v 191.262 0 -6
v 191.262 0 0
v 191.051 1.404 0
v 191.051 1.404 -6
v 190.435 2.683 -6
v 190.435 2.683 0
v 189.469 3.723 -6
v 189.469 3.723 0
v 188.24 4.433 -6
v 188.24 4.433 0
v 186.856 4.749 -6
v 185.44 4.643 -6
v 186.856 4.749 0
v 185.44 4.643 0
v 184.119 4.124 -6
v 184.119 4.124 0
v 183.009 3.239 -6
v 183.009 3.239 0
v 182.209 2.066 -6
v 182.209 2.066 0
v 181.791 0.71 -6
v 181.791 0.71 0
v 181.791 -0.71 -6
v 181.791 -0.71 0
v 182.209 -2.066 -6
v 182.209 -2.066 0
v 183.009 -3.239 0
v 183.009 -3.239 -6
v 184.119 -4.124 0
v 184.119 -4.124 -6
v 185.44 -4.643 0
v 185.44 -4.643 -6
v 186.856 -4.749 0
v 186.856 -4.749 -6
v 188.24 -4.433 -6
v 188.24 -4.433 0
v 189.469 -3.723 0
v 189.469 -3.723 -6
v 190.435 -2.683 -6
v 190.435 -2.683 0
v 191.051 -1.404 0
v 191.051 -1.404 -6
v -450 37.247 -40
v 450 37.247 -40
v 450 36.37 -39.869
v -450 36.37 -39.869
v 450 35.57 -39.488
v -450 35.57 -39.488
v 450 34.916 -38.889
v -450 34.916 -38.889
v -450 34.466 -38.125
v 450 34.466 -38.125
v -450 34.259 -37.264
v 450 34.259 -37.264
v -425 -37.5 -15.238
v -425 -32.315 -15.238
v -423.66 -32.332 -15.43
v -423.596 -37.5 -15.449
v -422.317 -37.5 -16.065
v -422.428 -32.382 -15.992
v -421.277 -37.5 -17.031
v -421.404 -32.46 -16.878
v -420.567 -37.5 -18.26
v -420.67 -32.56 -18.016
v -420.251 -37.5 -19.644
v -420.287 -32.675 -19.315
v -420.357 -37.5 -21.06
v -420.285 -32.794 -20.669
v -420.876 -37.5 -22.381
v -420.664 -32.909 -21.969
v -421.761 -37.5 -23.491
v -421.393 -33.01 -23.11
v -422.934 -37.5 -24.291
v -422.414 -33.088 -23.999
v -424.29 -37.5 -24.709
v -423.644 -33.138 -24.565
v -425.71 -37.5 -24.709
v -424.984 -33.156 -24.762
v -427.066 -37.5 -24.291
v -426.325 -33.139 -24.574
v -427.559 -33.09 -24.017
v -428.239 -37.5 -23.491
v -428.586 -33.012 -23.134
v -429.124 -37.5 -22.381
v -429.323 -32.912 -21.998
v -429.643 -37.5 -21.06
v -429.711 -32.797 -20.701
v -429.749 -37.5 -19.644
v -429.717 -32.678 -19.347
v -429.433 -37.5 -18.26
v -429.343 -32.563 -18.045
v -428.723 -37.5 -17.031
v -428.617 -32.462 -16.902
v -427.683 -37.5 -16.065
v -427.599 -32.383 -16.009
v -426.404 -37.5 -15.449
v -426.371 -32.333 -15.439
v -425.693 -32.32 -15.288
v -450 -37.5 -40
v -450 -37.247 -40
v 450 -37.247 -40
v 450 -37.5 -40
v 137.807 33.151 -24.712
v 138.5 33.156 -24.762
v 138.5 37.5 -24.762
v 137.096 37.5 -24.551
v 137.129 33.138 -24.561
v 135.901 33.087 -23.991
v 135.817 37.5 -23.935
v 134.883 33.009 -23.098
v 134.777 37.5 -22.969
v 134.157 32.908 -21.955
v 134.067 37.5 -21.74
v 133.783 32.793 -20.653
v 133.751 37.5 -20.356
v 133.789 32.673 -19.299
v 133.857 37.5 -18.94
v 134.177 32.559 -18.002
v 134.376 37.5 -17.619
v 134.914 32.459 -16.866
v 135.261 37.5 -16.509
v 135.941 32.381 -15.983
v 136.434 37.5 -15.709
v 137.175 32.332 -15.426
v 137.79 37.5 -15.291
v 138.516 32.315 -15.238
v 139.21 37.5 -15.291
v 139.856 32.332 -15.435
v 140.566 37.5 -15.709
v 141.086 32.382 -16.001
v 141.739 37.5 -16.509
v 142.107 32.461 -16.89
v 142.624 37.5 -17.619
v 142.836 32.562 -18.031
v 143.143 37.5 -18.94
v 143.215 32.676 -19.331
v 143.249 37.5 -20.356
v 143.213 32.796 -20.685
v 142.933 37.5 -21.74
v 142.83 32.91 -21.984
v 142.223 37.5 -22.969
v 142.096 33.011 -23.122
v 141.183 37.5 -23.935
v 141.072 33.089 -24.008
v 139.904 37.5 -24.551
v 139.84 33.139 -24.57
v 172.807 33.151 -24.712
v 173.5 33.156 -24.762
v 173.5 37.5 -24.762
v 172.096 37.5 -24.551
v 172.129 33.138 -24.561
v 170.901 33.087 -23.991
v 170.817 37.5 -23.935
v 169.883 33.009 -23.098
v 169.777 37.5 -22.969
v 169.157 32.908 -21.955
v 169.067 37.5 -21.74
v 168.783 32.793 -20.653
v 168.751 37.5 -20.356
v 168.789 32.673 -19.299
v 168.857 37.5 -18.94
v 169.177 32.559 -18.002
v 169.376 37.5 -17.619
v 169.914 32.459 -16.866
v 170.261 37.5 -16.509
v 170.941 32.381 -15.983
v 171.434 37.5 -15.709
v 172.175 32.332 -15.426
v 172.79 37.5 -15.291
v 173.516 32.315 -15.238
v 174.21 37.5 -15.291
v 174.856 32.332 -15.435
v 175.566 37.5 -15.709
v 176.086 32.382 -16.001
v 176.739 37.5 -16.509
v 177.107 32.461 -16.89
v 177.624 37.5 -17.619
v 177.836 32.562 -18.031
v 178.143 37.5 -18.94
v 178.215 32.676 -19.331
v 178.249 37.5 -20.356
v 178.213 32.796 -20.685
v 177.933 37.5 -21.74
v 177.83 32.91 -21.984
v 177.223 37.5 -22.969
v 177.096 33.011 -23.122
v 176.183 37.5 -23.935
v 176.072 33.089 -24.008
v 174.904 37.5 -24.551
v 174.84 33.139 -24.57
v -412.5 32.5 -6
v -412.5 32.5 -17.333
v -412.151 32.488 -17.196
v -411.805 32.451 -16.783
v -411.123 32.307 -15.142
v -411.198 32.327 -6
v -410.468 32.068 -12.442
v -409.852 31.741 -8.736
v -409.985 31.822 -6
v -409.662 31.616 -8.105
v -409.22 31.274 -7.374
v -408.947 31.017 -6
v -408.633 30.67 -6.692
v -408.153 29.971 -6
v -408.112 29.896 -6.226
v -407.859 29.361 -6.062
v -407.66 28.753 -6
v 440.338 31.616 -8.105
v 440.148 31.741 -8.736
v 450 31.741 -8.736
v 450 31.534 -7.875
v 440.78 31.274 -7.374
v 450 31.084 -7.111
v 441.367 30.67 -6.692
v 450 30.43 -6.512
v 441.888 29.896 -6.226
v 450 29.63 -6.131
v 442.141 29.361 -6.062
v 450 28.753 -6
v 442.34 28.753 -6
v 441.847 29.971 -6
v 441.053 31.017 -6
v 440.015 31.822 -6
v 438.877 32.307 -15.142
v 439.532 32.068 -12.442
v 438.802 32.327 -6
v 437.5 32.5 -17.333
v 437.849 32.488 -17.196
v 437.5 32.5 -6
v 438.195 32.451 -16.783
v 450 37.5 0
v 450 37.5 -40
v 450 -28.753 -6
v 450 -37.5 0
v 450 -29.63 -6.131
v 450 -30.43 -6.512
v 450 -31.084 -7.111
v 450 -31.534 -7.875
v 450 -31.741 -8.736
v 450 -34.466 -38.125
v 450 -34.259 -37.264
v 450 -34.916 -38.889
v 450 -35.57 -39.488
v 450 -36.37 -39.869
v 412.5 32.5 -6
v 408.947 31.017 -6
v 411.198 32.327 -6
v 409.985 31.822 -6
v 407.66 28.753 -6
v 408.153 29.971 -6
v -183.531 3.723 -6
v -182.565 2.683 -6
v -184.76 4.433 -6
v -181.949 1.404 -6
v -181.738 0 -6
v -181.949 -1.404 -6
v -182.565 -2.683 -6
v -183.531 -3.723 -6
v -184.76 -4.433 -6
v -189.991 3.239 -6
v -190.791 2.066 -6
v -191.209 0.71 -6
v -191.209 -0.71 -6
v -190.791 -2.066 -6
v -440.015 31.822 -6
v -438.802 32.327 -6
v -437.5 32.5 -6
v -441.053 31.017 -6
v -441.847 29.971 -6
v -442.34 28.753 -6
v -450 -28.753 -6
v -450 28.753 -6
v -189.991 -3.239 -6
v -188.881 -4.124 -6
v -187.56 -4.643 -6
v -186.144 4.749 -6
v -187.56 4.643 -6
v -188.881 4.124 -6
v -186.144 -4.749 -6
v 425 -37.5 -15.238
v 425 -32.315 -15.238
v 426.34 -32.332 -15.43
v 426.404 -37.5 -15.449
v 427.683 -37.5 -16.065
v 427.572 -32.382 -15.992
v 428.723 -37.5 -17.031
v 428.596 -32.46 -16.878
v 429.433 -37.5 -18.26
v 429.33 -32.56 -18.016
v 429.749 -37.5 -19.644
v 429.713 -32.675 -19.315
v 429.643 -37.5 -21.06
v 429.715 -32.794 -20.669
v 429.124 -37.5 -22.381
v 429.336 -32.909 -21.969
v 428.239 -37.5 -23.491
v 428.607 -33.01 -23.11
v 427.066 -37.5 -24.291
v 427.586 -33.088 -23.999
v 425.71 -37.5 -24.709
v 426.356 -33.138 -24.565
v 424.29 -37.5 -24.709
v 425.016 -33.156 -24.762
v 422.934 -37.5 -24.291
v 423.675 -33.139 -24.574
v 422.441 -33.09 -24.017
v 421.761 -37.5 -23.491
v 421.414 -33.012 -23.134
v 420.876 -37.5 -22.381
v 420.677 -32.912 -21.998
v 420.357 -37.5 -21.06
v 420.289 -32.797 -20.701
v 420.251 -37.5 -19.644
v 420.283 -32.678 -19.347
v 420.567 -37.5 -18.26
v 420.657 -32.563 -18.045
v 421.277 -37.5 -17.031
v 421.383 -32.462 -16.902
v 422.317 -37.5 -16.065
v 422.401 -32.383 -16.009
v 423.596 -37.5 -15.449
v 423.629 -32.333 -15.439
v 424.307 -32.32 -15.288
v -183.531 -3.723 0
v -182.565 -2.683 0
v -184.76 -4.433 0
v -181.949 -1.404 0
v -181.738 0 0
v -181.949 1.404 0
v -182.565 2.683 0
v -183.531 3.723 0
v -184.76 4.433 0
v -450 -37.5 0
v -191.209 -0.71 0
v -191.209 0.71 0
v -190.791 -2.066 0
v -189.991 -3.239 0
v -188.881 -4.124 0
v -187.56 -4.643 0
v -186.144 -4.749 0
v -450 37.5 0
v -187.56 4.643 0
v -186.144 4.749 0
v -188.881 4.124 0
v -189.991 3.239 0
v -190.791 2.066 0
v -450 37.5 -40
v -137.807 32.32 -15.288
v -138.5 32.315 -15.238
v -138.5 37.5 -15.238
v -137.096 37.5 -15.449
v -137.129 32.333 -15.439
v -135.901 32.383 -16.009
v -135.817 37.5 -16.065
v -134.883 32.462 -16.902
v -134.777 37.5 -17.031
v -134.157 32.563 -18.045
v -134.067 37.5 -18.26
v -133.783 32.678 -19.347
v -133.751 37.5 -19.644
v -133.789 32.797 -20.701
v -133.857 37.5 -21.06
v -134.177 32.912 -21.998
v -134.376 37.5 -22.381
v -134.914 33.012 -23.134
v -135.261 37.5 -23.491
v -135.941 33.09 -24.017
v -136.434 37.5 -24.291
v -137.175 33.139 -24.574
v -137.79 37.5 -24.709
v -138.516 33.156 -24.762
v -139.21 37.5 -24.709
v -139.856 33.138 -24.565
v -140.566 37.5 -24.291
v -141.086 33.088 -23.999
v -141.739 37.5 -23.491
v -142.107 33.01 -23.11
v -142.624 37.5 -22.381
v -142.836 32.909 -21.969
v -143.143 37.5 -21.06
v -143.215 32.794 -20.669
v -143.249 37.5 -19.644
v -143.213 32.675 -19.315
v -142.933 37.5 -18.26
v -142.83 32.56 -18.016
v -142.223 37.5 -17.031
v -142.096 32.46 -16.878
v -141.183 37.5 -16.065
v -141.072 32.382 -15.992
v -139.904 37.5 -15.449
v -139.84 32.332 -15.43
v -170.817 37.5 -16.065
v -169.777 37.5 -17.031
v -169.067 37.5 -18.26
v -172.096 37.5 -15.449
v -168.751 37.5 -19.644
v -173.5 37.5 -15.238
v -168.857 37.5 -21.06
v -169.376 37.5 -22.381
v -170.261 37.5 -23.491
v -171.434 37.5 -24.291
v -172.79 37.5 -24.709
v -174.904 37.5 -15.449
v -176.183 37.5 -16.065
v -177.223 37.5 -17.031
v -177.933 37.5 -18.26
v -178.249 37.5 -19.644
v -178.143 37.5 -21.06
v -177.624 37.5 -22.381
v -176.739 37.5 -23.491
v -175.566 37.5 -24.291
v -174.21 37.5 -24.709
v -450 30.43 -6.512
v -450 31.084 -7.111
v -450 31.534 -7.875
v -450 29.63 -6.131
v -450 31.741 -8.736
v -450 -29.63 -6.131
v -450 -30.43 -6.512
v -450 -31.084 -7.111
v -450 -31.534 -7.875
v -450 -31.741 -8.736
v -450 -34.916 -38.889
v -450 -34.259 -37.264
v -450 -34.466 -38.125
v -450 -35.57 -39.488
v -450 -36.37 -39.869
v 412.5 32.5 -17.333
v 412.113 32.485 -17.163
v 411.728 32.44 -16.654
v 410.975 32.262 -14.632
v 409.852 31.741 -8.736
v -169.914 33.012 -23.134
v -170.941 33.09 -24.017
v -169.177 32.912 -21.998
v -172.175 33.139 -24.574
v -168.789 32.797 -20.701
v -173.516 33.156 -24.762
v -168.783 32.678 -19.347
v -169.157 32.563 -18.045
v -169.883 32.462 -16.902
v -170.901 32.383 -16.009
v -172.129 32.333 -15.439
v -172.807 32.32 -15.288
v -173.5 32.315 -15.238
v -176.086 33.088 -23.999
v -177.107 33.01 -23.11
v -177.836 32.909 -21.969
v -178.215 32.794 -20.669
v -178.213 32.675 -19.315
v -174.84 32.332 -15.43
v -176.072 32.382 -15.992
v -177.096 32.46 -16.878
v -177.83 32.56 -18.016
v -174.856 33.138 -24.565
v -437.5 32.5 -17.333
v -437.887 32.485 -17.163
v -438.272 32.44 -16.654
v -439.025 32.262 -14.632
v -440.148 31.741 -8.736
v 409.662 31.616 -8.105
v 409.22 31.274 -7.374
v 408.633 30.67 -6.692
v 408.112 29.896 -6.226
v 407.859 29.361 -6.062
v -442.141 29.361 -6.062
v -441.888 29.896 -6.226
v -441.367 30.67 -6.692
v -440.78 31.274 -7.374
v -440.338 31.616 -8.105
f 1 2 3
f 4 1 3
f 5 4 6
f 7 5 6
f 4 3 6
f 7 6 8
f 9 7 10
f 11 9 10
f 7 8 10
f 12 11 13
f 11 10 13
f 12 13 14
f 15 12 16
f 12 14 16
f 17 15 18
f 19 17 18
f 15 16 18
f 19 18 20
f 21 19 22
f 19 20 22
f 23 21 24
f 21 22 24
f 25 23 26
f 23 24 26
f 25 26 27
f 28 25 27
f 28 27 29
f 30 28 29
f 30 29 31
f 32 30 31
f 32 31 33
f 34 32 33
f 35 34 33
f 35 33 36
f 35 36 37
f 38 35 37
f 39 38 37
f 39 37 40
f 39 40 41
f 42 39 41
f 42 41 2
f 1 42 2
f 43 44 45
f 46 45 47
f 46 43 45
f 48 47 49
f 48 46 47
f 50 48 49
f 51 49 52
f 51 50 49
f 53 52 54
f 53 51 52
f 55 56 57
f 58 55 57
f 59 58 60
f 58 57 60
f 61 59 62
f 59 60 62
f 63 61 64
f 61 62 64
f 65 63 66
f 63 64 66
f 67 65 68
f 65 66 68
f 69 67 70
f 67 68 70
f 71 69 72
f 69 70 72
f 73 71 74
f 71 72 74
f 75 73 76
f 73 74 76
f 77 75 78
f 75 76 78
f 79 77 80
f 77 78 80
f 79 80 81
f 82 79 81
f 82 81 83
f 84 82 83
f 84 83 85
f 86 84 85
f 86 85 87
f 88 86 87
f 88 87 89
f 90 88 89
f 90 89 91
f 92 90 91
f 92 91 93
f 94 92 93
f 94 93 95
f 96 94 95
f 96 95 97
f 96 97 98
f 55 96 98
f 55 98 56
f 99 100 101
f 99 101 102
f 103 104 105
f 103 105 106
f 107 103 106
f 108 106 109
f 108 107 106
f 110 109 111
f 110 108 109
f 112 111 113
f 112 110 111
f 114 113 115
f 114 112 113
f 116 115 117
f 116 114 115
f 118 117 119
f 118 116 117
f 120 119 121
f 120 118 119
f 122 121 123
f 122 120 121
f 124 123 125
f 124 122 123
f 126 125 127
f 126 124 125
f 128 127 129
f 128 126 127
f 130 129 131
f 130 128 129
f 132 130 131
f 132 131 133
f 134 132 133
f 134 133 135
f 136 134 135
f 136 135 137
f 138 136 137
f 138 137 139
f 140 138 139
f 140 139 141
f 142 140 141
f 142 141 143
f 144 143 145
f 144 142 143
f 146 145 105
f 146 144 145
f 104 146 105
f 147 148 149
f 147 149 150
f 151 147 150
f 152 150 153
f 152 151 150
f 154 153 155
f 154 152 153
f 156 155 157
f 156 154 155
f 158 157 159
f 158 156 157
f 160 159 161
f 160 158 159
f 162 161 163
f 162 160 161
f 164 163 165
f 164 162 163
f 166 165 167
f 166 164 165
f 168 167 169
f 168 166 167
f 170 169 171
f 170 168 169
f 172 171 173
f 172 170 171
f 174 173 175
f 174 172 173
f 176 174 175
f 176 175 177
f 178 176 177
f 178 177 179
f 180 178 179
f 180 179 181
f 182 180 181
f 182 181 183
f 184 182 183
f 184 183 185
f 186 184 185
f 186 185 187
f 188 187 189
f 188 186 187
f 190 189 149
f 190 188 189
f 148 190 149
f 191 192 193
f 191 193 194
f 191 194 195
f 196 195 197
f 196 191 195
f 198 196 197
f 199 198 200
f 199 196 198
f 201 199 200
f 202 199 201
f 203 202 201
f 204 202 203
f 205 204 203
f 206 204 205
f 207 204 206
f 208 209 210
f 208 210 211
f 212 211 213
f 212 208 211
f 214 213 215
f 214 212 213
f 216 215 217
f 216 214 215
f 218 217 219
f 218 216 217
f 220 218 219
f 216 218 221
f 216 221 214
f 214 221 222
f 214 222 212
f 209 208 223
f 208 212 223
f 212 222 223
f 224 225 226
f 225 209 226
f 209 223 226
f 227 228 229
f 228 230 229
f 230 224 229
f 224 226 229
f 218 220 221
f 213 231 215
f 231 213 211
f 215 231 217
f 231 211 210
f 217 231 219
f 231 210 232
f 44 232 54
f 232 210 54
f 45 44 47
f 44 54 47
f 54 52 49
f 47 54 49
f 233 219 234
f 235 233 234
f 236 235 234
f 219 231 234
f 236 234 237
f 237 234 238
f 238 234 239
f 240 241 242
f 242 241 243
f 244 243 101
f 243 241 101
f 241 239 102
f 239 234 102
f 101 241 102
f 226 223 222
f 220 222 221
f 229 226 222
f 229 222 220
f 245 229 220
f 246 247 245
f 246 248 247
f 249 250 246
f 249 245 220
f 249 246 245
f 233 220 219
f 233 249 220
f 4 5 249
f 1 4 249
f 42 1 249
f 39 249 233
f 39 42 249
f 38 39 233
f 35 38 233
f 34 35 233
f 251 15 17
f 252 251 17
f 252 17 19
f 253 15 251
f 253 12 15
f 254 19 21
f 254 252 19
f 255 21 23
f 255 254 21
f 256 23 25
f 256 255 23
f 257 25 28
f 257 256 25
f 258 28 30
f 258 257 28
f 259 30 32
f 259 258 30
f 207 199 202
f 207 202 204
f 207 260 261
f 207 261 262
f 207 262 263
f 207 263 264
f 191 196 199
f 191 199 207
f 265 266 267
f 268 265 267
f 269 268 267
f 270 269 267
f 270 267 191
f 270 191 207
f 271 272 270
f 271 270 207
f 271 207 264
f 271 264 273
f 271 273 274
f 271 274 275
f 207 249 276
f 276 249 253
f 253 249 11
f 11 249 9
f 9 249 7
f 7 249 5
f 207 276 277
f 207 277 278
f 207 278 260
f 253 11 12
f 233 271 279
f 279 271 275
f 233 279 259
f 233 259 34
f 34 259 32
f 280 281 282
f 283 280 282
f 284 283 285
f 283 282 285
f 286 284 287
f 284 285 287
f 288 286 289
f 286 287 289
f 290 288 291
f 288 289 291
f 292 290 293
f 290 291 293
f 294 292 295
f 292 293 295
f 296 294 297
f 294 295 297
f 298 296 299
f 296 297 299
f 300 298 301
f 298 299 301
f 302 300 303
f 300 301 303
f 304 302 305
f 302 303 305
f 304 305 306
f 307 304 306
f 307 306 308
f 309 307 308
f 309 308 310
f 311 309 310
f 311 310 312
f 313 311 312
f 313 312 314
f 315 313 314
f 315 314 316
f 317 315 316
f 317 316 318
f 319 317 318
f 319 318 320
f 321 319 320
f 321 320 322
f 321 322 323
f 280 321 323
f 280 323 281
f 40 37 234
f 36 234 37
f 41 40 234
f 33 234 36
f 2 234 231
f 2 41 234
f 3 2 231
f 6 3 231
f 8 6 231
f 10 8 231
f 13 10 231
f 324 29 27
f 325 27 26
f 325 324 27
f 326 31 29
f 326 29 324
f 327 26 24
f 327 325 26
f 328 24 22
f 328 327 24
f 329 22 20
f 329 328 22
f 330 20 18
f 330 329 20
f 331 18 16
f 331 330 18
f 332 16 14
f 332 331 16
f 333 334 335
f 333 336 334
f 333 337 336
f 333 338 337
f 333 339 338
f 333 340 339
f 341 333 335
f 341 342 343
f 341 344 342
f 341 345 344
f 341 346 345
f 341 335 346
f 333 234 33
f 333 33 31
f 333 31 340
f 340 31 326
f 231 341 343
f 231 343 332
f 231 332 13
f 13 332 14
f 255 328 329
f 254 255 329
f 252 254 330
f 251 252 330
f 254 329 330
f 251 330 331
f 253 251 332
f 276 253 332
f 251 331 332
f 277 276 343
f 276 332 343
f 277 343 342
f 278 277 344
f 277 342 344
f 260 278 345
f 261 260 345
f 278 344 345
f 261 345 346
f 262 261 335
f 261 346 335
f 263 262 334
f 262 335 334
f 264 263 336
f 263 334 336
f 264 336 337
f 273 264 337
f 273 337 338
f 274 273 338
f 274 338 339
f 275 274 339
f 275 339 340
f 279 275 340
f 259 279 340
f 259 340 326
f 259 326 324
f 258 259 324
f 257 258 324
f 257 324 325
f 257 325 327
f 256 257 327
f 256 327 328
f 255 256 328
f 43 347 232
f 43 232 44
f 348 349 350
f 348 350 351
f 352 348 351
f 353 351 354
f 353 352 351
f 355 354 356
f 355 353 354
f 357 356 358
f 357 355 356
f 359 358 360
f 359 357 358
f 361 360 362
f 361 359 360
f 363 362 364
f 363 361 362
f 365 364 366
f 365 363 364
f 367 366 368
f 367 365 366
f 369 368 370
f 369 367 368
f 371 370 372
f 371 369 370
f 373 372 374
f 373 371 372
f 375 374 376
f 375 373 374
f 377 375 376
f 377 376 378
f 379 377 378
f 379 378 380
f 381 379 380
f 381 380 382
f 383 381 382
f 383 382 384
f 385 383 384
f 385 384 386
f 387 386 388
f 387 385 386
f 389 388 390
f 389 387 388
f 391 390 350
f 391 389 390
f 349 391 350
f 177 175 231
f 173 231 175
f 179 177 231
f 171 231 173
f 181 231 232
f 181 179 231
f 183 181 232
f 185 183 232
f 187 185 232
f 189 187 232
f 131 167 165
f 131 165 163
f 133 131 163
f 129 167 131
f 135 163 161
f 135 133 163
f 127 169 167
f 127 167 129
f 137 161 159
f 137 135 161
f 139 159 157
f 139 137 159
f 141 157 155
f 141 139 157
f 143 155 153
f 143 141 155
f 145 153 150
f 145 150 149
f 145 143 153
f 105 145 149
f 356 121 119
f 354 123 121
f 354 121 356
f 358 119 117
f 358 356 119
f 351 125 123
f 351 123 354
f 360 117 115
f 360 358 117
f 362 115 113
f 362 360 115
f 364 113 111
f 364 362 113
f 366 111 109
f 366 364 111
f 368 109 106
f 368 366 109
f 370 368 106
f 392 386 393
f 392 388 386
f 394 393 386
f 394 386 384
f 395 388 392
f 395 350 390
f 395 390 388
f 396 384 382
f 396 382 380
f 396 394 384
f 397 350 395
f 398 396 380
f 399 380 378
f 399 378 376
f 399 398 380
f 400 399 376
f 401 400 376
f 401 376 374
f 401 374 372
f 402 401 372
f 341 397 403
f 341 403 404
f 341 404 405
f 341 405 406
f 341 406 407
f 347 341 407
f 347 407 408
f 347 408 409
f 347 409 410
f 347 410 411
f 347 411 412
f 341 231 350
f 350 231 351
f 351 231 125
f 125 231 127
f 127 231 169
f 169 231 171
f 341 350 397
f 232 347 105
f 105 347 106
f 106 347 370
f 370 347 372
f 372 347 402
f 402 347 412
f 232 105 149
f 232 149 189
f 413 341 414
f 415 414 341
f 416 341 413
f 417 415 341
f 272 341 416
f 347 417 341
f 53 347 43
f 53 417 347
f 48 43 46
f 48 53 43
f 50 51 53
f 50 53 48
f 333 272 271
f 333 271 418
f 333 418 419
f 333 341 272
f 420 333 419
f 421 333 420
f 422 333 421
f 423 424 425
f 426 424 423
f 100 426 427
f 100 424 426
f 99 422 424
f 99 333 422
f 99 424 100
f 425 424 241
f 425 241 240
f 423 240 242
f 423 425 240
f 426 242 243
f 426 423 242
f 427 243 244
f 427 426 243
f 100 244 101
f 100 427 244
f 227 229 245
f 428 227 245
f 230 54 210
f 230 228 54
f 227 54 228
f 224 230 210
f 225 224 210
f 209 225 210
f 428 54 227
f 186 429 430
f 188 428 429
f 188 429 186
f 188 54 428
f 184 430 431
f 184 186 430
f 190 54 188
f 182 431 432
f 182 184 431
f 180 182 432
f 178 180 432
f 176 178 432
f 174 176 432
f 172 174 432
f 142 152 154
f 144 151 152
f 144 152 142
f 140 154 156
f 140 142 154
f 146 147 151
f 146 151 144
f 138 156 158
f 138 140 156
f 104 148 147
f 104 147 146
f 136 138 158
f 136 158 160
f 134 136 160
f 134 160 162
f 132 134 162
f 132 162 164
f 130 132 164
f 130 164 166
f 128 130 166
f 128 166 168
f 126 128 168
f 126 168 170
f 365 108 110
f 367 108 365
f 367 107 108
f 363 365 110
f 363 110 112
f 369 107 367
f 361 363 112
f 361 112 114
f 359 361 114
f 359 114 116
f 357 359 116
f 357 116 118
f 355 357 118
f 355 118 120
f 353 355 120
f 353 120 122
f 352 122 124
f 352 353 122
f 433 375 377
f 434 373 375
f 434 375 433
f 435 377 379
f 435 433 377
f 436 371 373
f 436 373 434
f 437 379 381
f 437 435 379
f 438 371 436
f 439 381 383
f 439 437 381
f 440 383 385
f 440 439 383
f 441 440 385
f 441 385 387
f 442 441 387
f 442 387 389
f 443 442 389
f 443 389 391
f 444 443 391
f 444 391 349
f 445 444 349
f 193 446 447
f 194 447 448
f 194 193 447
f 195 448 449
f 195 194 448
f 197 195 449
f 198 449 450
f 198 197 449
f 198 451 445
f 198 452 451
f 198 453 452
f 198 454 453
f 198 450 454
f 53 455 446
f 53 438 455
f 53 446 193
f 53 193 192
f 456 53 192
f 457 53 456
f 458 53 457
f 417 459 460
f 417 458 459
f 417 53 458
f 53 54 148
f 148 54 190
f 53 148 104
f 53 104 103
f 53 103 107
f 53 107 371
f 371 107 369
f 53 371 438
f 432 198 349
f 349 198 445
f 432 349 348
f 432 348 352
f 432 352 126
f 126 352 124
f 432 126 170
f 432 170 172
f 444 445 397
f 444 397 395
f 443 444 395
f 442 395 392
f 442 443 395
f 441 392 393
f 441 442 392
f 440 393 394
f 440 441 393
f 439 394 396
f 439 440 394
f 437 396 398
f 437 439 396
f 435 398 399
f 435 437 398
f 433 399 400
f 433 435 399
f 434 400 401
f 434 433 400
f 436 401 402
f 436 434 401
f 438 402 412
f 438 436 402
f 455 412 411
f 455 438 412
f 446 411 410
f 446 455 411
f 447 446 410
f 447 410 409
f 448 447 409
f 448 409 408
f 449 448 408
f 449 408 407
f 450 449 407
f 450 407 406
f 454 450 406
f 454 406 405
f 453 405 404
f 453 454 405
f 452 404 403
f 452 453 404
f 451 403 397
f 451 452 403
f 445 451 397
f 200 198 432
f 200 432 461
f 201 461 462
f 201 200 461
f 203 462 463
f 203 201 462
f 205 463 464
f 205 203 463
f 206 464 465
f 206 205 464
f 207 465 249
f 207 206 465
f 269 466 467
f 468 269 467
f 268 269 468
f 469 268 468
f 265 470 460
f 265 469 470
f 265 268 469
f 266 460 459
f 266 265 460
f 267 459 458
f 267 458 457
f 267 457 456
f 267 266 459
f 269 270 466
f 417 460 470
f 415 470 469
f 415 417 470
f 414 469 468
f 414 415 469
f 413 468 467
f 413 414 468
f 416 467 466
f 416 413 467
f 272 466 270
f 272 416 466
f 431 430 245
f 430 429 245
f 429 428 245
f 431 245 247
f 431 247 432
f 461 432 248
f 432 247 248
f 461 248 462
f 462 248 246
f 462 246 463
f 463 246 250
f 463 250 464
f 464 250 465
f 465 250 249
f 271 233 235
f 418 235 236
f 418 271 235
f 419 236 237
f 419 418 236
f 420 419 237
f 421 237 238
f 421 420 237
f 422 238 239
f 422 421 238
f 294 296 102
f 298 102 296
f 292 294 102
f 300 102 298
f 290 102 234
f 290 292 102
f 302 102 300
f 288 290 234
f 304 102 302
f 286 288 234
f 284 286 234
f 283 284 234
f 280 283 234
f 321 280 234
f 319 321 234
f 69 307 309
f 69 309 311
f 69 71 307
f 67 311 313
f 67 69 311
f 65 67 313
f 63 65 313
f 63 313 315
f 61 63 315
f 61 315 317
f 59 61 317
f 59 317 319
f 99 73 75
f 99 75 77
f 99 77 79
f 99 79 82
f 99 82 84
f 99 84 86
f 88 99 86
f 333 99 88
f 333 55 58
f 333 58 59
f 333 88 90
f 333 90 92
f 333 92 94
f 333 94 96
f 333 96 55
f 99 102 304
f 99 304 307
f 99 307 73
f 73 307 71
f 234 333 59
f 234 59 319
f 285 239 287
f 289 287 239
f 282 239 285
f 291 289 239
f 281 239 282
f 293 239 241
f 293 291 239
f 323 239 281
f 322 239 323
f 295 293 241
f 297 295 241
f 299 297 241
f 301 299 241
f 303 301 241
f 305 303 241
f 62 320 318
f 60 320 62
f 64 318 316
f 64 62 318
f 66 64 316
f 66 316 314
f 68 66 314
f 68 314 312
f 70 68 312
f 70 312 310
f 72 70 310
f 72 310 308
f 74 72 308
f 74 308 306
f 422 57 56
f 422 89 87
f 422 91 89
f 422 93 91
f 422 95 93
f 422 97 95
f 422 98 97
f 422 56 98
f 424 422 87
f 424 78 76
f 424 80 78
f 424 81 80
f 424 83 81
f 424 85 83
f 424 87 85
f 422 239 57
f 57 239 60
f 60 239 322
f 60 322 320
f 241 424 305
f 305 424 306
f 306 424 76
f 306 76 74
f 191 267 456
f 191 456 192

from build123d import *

# Parameters (mm, degrees)
STRUCTURAL_MEMBER1_DEPTH = 900
SKETCH12_R               = 4.7625
CUT_EXTRUDE1_DEPTH       = 454.327971782
CUT_EXTRUDE2_DEPTH       = 40
SKETCH16_R               = 4.7625
CUT_EXTRUDE3_DEPTH       = 454.327971881
SKETCH17_R               = 4.7625
CUT_EXTRUDE4_DEPTH       = 454.327971881


with BuildPart() as part:
    # Sketch19 → Structural Member1 (new body)
    with BuildSketch(Plane(origin=(-450, 0, 0), x_dir=(0, 0, 1), z_dir=(1, 0, 0))):
        with BuildLine():
            Line((0, 37.5), (0, -37.5))
            Line((0, -37.5), (-40, -37.5))
            Line((-40, -37.5), (-40, -37.246949676))
            ThreePointArc((-40, -37.246949676), (-39.212582687, -35.220998578), (-37.263681431, -34.258560126))
            Line((-37.263681431, -34.258560126), (-8.736318569, -31.741439874))
            ThreePointArc((-8.736318569, -31.741439874), (-6.787417313, -30.779001422), (-6, -28.753050324))
            Line((-6, -28.753050324), (-6, 28.753050324))
            ThreePointArc((-6, 28.753050324), (-6.787417313, 30.779001422), (-8.736318569, 31.741439874))
            Line((-8.736318569, 31.741439874), (-37.263681431, 34.258560126))
            ThreePointArc((-37.263681431, 34.258560126), (-39.212582687, 35.220998578), (-40, 37.246949676))
            Line((-40, 37.246949676), (-40, 37.5))
            Line((-40, 37.5), (0, 37.5))
        make_face()
    extrude(amount=STRUCTURAL_MEMBER1_DEPTH)

    # Sketch12 → Cut-Extrude1 (cut, through all)
    with BuildSketch(Plane(origin=(0, 0, 0), x_dir=(1, 0, 0), z_dir=(0, 1, 0))):
        with Locations(Location((-425, 20, 0), (0, 0, 270))):
            Circle(SKETCH12_R)
        with Locations(Location((425, 20, 0), (0, 0, 270))):
            Circle(SKETCH12_R)
    extrude(amount=-CUT_EXTRUDE1_DEPTH, mode=Mode.SUBTRACT)

    # Sketch15 → Cut-Extrude2 (cut)
    with BuildSketch(Plane(origin=(0, 0, -6), x_dir=(-1, 0, 0), z_dir=(0, 0, -1))):
        with BuildLine():
            Line((-412.5, 22.5), (-437.5, 22.5))
            ThreePointArc((-437.5, 22.5), (-442.5, 27.5), (-437.5, 32.5))
            Line((-437.5, 32.5), (-412.5, 32.5))
            ThreePointArc((-412.5, 32.5), (-407.5, 27.5), (-412.5, 22.5))
        make_face()
        with BuildLine():
            Line((412.5, 22.5), (437.5, 22.5))
            ThreePointArc((437.5, 22.5), (442.5, 27.5), (437.5, 32.5))
            Line((437.5, 32.5), (412.5, 32.5))
            ThreePointArc((412.5, 32.5), (407.5, 27.5), (412.5, 22.5))
        make_face()
    extrude(amount=CUT_EXTRUDE2_DEPTH, mode=Mode.SUBTRACT)

    # Sketch16 → Cut-Extrude3 (cut, through all)
    with BuildSketch(Plane(origin=(0, 0, 0), x_dir=(1, 0, 0), z_dir=(0, 1, 0))):
        with Locations(Location((-173.5, 20, 0), (0, 0, 270))):
            Circle(SKETCH16_R)
        with Locations(Location((-138.5, 20, 0), (0, 0, 270))):
            Circle(SKETCH16_R)
        with Locations(Location((138.5, 20, 0), (0, 0, 90))):
            Circle(SKETCH16_R)
        with Locations(Location((173.5, 20, 0), (0, 0, 90))):
            Circle(SKETCH16_R)
    extrude(amount=CUT_EXTRUDE3_DEPTH, mode=Mode.SUBTRACT)

    # Sketch17 → Cut-Extrude4 (cut, through all)
    with BuildSketch(Plane.XY):
        with Locations((-186.5, 0)):
            Circle(SKETCH17_R)
        with Locations((186.5, 0)):
            Circle(SKETCH17_R)
    extrude(amount=-CUT_EXTRUDE4_DEPTH, mode=Mode.SUBTRACT)


solid = part.part
